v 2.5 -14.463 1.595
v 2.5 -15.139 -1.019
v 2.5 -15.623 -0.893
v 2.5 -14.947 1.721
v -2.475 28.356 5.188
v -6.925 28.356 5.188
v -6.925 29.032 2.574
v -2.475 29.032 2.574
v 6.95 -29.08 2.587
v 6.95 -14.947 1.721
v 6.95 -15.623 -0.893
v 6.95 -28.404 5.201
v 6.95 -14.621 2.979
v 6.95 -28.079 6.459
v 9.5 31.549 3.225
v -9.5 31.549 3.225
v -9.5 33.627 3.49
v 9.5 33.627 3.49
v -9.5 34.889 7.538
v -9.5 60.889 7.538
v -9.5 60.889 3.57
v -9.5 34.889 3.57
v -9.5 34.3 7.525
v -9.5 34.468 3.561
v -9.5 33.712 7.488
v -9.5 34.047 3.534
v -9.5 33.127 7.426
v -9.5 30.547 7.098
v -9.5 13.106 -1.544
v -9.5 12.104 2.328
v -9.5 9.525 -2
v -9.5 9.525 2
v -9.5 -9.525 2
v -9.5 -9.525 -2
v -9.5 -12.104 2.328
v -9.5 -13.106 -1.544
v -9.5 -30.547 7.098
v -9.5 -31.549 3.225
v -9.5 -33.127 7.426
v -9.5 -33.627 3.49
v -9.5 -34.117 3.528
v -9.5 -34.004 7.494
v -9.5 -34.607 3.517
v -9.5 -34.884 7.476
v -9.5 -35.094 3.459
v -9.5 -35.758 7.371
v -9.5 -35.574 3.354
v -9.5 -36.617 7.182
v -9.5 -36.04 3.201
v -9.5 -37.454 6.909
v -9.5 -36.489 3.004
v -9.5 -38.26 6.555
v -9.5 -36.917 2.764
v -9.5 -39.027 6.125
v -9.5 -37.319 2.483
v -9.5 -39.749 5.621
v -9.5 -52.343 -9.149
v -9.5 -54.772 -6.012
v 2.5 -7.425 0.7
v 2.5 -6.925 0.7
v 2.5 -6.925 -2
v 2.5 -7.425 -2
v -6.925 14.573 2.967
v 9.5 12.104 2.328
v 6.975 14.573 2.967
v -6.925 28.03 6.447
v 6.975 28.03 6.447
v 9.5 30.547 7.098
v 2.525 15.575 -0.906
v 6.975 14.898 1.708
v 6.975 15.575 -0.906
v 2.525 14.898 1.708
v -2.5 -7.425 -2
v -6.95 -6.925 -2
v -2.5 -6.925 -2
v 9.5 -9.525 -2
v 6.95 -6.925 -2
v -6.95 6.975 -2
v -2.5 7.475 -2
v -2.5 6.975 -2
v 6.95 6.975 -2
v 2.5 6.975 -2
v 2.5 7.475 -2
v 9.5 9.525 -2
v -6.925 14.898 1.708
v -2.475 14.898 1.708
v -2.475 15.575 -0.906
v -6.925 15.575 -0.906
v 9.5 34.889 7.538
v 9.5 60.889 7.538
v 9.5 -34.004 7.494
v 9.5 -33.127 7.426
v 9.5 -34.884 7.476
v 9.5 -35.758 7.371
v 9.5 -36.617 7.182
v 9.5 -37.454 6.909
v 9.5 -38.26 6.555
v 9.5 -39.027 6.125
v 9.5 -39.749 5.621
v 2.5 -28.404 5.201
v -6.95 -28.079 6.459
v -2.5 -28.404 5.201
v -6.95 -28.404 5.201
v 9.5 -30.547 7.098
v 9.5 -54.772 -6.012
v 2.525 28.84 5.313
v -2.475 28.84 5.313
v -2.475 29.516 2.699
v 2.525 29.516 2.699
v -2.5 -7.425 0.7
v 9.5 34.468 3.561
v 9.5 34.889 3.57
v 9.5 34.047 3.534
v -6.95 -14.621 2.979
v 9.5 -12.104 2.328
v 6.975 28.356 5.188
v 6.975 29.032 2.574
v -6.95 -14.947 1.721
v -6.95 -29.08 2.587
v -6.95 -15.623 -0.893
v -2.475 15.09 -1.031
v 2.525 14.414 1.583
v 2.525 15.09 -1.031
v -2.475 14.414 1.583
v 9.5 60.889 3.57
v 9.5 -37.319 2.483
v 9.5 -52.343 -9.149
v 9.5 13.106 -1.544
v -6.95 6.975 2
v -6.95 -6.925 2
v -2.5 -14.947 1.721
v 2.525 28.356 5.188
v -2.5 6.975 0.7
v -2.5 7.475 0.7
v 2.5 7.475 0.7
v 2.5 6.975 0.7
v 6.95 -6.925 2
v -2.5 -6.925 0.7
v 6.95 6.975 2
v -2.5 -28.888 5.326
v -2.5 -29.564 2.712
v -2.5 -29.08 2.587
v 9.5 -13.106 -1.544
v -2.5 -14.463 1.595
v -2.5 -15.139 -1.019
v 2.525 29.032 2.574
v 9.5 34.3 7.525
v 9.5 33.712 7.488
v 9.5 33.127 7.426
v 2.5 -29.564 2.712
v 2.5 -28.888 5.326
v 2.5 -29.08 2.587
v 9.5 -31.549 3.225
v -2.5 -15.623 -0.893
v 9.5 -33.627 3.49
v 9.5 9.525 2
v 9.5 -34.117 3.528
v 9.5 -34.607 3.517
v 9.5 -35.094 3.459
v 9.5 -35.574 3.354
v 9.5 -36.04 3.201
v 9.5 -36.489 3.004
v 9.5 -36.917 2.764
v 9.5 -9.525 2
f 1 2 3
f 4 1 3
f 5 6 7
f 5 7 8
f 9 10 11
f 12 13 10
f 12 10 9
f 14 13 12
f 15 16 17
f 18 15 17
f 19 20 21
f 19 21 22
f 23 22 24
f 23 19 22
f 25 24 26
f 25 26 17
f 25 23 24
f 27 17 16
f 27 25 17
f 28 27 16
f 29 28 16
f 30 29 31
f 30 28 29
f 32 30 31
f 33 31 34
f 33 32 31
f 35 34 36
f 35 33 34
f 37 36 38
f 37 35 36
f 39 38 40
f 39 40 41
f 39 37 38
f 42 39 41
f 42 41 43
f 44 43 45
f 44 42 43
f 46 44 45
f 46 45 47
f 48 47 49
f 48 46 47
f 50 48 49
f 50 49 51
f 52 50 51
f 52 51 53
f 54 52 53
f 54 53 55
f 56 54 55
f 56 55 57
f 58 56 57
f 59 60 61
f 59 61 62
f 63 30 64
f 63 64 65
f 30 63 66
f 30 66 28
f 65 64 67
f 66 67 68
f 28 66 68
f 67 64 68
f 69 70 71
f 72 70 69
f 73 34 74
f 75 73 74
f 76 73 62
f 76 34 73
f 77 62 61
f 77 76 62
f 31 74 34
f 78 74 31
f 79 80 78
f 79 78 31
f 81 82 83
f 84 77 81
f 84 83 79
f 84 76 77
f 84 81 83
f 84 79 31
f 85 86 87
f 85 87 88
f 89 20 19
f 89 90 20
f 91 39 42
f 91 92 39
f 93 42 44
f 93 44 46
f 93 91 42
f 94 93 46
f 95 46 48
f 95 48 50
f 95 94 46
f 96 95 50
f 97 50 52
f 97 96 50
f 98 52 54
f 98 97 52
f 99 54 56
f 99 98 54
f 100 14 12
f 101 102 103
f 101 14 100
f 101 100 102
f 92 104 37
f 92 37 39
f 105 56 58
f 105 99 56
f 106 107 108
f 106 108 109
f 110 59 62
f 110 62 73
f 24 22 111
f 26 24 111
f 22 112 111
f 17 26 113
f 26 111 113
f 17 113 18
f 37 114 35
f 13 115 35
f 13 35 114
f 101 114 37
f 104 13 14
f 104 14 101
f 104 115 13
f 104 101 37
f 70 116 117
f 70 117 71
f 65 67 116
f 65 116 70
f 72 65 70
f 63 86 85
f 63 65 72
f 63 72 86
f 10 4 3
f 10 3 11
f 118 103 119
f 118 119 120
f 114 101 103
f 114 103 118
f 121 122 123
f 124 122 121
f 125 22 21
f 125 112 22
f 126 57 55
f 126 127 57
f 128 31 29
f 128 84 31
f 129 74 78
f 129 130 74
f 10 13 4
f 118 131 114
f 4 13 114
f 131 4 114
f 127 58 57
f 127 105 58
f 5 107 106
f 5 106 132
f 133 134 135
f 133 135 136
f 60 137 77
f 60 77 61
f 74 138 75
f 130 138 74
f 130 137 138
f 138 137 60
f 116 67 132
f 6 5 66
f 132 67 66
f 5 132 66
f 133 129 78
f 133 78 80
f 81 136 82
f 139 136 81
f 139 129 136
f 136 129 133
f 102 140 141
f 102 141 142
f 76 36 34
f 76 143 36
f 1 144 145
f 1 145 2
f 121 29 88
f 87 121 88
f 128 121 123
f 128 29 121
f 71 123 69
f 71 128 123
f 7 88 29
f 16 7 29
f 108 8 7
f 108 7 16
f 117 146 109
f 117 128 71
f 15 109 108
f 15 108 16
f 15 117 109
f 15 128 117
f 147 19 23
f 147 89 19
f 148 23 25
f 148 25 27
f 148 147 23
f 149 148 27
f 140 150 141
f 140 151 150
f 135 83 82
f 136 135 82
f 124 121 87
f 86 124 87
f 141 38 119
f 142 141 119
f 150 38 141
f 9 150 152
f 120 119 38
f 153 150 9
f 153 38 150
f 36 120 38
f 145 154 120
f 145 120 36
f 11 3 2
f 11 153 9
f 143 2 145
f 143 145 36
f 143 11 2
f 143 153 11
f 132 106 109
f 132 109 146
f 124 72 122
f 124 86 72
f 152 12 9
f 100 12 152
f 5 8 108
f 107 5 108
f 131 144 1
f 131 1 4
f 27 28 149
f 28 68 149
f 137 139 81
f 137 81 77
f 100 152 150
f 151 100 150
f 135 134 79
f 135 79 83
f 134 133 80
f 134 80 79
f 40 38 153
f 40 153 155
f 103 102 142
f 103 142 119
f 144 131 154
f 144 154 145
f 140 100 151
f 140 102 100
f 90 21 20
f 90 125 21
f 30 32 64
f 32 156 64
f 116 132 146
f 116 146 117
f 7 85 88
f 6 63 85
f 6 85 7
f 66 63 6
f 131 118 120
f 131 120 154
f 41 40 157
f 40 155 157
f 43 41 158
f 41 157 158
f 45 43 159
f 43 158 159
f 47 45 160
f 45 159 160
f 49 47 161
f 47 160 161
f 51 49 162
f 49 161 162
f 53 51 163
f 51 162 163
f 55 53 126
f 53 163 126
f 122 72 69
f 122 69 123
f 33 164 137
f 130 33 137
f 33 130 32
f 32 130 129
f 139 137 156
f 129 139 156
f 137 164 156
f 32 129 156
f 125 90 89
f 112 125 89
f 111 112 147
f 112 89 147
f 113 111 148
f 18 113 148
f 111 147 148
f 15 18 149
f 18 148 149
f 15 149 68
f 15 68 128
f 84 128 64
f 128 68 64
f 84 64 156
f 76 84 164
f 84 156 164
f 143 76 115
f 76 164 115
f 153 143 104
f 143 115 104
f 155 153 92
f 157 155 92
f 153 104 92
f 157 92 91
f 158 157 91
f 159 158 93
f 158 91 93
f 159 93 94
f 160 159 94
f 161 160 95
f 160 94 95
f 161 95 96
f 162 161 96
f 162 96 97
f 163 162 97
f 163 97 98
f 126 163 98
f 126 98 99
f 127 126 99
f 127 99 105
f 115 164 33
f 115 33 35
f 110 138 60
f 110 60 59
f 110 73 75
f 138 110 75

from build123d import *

# Parameters (mm, degrees)
SKETCH005_W  = 13.9
SKETCH005_H  = 13.9
PAD006_DEPTH = 10
SKETCH006_W  = 13.9
SKETCH006_H  = 13.9
PAD007_DEPTH = 1.3
PAD008_DEPTH = 2.7
PAD009_DEPTH = 10
SKETCH009_W  = 13.9
SKETCH009_H  = 13.9
PAD011_DEPTH = 10
SKETCH010_W  = 13.9
SKETCH010_H  = 13.9
PAD012_DEPTH = 1.3
PAD013_DEPTH = 2.7
PAD014_DEPTH = 10
SKETCH001_W  = 13.9
SKETCH001_H  = 13.9
PAD001_DEPTH = 10
SKETCH002_W  = 13.9
SKETCH002_H  = 13.9
PAD002_DEPTH = 1.3
PAD003_DEPTH = 2.7
PAD004_DEPTH = 10
PAD015_DEPTH = 9.5


with BuildPart() as subtractormiddle:
    # Sketch005 (on Local_CS) → Pad006 (new body)
    with BuildSketch(Plane(origin=(0, 0.025, 2), x_dir=(0, -1, 0), z_dir=(0, 0, 1))):
        Rectangle(SKETCH005_W, SKETCH005_H)
    extrude(amount=PAD006_DEPTH)

    # Sketch006 (on Face5 of Pad006) → Pad007 (join)
    with BuildSketch(Plane(origin=(0, 0.025, 2), x_dir=(0, -1, 0), z_dir=(0, 0, -1))):
        Rectangle(SKETCH006_W, SKETCH006_H)
    extrude(amount=PAD007_DEPTH)

    # Sketch007 (on Face9 of Pad007) → Pad008 (join)
    with BuildSketch(Plane(origin=(0, 0.025, 0.7), x_dir=(0, -1, 0), z_dir=(0, 0, -1))):
        Polygon((-6.95, 6.95), (-6.95, 2.5), (-7.45, 2.5), (-7.45, -2.5), (-6.95, -2.5), (-6.95, -6.95), (6.95, -6.95), (6.95, -2.5), (7.45, -2.5), (7.45, 2.5), (6.95, 2.5), (6.95, 6.95), align=None)
    extrude(amount=PAD008_DEPTH)

    # Sketch007 (on Face9 of Pad007) → Pad009 (join)
    with BuildSketch(Plane(origin=(0, 0.025, 0.7), x_dir=(0, -1, 0), z_dir=(0, 0, -1))):
        Polygon((-6.95, 6.95), (-6.95, 2.5), (-7.45, 2.5), (-7.45, -2.5), (-6.95, -2.5), (-6.95, -6.95), (6.95, -6.95), (6.95, -2.5), (7.45, -2.5), (7.45, 2.5), (6.95, 2.5), (6.95, 6.95), align=None)
    extrude(amount=PAD009_DEPTH)


with BuildPart() as subtractorbottom:
    # Sketch009 (on Local_CS) → Pad011 (new body)
    with BuildSketch(Plane(origin=(0, -21.350023, 4.719246), x_dir=(0, -0.968148, 0.25038), z_dir=(0, 0.25038, 0.968148))):
        Rectangle(SKETCH009_W, SKETCH009_H)
    extrude(amount=PAD011_DEPTH)

    # Sketch010 (on Face5 of Pad011) → Pad012 (join)
    with BuildSketch(Plane(origin=(0, -21.350023, 4.719246), x_dir=(0, -0.968148, 0.25038), z_dir=(0, -0.25038, -0.968148))):
        Rectangle(SKETCH010_W, SKETCH010_H)
    extrude(amount=PAD012_DEPTH)

    # Sketch011 (on Face9 of Pad012) → Pad013 (join)
    with BuildSketch(Plane(origin=(0, -21.675517, 3.460654), x_dir=(0, -0.968148, 0.25038), z_dir=(0, -0.25038, -0.968148))):
        Polygon((-6.95, 6.95), (-6.95, 2.5), (-7.45, 2.5), (-7.45, -2.5), (-6.95, -2.5), (-6.95, -6.95), (6.95, -6.95), (6.95, -2.5), (7.45, -2.5), (7.45, 2.5), (6.95, 2.5), (6.95, 6.95), align=None)
    extrude(amount=PAD013_DEPTH)

    # Sketch011 (on Face9 of Pad012) → Pad014 (join)
    with BuildSketch(Plane(origin=(0, -21.675517, 3.460654), x_dir=(0, -0.968148, 0.25038), z_dir=(0, -0.25038, -0.968148))):
        Polygon((-6.95, 6.95), (-6.95, 2.5), (-7.45, 2.5), (-7.45, -2.5), (-6.95, -2.5), (-6.95, -6.95), (6.95, -6.95), (6.95, -2.5), (7.45, -2.5), (7.45, 2.5), (6.95, 2.5), (6.95, 6.95), align=None)
    extrude(amount=PAD014_DEPTH)


with BuildPart() as refinedsubtractorcompound2:
    # Sketch001 (on Local_CS) → Pad001 (new body)
    with BuildSketch(Plane(origin=(0.025, 21.301615, 4.706727), x_dir=(0, -0.968148, -0.25038), z_dir=(0, -0.25038, 0.968148))):
        Rectangle(SKETCH001_W, SKETCH001_H)
    extrude(amount=PAD001_DEPTH)

    # Sketch002 (on Face5 of Pad001) → Pad002 (join)
    with BuildSketch(Plane(origin=(0.025, 21.301615, 4.706727), x_dir=(0, -0.968148, -0.25038), z_dir=(0, 0.25038, -0.968148))):
        Rectangle(SKETCH002_W, SKETCH002_H)
    extrude(amount=PAD002_DEPTH)

    # Sketch003 (on Face9 of Pad002) → Pad003 (join)
    with BuildSketch(Plane(origin=(0.025, 21.627109, 3.448135), x_dir=(0, -0.968148, -0.25038), z_dir=(0, 0.25038, -0.968148))):
        Polygon((-6.95, 6.95), (-6.95, 2.5), (-7.45, 2.5), (-7.45, -2.5), (-6.95, -2.5), (-6.95, -6.95), (6.95, -6.95), (6.95, -2.5), (7.45, -2.5), (7.45, 2.5), (6.95, 2.5), (6.95, 6.95), align=None)
    extrude(amount=PAD003_DEPTH)

    # Sketch003 (on Face9 of Pad002) → Pad004 (join)
    with BuildSketch(Plane(origin=(0.025, 21.627109, 3.448135), x_dir=(0, -0.968148, -0.25038), z_dir=(0, 0.25038, -0.968148))):
        Polygon((-6.95, 6.95), (-6.95, 2.5), (-7.45, 2.5), (-7.45, -2.5), (-6.95, -2.5), (-6.95, -6.95), (6.95, -6.95), (6.95, -2.5), (7.45, -2.5), (7.45, 2.5), (6.95, 2.5), (6.95, 6.95), align=None)
    extrude(amount=PAD004_DEPTH)

    # Compound: union SubtractorMiddle, SubtractorBottom
    add(subtractormiddle.part)
    add(subtractorbottom.part)


with BuildPart() as keycolumnstraightnice:
    # Sketch012 → Pad015 (new body, symmetric)
    with BuildSketch(Plane.YZ):
        with BuildLine():
            Line((-9.525, 2), (9.525, 2))
            Line((9.525, 2), (12.104213, 2.328117))
            Line((12.104213, 2.328117), (30.547425, 7.097856))
            Line((30.547425, 7.097856), (33.126638, 7.425974))
            ThreePointArc((34.889388, 7.537649), (34.006246, 7.509702), (33.126638, 7.425974))
            Line((60.889388, 7.537649), (34.889388, 7.537649))
            Line((60.889388, 3.569629), (60.889388, 7.537649))
            Line((34.889388, 3.569629), (60.889388, 3.569629))
            ThreePointArc((34.889388, 3.569629), (34.257128, 3.549621), (33.627398, 3.489678))
            Line((31.548945, 3.225266), (33.627398, 3.489678))
            Line((13.105733, -1.544473), (31.548945, 3.225266))
            Line((9.525, -2), (13.105733, -1.544473))
            Line((-9.525, -2), (9.525, -2))
            Line((-13.105733, -1.544473), (-9.525, -2))
            Line((-31.548945, 3.225266), (-13.105733, -1.544473))
            Line((-31.548945, 3.225266), (-33.627398, 3.489678))
            ThreePointArc((-33.627398, 3.489678), (-35.573549, 3.35359), (-37.31948, 2.483102))
            Line((-52.342581, -9.149027), (-37.31948, 2.483102))
            Line((-54.771872, -6.011555), (-52.342581, -9.149027))
            Line((-39.74877, 5.620573), (-54.771872, -6.011555))
            ThreePointArc((-33.126638, 7.425974), (-36.617262, 7.181886), (-39.74877, 5.620573))
            Line((-30.547425, 7.097856), (-33.126638, 7.425974))
            Line((-12.104213, 2.328117), (-30.547425, 7.097856))
            Line((-9.525, 2), (-12.104213, 2.328117))
        make_face()
    extrude(amount=PAD015_DEPTH, both=True)

    # Cut002: cut RefinedSubtractorCompound2
    add(refinedsubtractorcompound2.part, mode=Mode.SUBTRACT)


solid = keycolumnstraightnice.part
